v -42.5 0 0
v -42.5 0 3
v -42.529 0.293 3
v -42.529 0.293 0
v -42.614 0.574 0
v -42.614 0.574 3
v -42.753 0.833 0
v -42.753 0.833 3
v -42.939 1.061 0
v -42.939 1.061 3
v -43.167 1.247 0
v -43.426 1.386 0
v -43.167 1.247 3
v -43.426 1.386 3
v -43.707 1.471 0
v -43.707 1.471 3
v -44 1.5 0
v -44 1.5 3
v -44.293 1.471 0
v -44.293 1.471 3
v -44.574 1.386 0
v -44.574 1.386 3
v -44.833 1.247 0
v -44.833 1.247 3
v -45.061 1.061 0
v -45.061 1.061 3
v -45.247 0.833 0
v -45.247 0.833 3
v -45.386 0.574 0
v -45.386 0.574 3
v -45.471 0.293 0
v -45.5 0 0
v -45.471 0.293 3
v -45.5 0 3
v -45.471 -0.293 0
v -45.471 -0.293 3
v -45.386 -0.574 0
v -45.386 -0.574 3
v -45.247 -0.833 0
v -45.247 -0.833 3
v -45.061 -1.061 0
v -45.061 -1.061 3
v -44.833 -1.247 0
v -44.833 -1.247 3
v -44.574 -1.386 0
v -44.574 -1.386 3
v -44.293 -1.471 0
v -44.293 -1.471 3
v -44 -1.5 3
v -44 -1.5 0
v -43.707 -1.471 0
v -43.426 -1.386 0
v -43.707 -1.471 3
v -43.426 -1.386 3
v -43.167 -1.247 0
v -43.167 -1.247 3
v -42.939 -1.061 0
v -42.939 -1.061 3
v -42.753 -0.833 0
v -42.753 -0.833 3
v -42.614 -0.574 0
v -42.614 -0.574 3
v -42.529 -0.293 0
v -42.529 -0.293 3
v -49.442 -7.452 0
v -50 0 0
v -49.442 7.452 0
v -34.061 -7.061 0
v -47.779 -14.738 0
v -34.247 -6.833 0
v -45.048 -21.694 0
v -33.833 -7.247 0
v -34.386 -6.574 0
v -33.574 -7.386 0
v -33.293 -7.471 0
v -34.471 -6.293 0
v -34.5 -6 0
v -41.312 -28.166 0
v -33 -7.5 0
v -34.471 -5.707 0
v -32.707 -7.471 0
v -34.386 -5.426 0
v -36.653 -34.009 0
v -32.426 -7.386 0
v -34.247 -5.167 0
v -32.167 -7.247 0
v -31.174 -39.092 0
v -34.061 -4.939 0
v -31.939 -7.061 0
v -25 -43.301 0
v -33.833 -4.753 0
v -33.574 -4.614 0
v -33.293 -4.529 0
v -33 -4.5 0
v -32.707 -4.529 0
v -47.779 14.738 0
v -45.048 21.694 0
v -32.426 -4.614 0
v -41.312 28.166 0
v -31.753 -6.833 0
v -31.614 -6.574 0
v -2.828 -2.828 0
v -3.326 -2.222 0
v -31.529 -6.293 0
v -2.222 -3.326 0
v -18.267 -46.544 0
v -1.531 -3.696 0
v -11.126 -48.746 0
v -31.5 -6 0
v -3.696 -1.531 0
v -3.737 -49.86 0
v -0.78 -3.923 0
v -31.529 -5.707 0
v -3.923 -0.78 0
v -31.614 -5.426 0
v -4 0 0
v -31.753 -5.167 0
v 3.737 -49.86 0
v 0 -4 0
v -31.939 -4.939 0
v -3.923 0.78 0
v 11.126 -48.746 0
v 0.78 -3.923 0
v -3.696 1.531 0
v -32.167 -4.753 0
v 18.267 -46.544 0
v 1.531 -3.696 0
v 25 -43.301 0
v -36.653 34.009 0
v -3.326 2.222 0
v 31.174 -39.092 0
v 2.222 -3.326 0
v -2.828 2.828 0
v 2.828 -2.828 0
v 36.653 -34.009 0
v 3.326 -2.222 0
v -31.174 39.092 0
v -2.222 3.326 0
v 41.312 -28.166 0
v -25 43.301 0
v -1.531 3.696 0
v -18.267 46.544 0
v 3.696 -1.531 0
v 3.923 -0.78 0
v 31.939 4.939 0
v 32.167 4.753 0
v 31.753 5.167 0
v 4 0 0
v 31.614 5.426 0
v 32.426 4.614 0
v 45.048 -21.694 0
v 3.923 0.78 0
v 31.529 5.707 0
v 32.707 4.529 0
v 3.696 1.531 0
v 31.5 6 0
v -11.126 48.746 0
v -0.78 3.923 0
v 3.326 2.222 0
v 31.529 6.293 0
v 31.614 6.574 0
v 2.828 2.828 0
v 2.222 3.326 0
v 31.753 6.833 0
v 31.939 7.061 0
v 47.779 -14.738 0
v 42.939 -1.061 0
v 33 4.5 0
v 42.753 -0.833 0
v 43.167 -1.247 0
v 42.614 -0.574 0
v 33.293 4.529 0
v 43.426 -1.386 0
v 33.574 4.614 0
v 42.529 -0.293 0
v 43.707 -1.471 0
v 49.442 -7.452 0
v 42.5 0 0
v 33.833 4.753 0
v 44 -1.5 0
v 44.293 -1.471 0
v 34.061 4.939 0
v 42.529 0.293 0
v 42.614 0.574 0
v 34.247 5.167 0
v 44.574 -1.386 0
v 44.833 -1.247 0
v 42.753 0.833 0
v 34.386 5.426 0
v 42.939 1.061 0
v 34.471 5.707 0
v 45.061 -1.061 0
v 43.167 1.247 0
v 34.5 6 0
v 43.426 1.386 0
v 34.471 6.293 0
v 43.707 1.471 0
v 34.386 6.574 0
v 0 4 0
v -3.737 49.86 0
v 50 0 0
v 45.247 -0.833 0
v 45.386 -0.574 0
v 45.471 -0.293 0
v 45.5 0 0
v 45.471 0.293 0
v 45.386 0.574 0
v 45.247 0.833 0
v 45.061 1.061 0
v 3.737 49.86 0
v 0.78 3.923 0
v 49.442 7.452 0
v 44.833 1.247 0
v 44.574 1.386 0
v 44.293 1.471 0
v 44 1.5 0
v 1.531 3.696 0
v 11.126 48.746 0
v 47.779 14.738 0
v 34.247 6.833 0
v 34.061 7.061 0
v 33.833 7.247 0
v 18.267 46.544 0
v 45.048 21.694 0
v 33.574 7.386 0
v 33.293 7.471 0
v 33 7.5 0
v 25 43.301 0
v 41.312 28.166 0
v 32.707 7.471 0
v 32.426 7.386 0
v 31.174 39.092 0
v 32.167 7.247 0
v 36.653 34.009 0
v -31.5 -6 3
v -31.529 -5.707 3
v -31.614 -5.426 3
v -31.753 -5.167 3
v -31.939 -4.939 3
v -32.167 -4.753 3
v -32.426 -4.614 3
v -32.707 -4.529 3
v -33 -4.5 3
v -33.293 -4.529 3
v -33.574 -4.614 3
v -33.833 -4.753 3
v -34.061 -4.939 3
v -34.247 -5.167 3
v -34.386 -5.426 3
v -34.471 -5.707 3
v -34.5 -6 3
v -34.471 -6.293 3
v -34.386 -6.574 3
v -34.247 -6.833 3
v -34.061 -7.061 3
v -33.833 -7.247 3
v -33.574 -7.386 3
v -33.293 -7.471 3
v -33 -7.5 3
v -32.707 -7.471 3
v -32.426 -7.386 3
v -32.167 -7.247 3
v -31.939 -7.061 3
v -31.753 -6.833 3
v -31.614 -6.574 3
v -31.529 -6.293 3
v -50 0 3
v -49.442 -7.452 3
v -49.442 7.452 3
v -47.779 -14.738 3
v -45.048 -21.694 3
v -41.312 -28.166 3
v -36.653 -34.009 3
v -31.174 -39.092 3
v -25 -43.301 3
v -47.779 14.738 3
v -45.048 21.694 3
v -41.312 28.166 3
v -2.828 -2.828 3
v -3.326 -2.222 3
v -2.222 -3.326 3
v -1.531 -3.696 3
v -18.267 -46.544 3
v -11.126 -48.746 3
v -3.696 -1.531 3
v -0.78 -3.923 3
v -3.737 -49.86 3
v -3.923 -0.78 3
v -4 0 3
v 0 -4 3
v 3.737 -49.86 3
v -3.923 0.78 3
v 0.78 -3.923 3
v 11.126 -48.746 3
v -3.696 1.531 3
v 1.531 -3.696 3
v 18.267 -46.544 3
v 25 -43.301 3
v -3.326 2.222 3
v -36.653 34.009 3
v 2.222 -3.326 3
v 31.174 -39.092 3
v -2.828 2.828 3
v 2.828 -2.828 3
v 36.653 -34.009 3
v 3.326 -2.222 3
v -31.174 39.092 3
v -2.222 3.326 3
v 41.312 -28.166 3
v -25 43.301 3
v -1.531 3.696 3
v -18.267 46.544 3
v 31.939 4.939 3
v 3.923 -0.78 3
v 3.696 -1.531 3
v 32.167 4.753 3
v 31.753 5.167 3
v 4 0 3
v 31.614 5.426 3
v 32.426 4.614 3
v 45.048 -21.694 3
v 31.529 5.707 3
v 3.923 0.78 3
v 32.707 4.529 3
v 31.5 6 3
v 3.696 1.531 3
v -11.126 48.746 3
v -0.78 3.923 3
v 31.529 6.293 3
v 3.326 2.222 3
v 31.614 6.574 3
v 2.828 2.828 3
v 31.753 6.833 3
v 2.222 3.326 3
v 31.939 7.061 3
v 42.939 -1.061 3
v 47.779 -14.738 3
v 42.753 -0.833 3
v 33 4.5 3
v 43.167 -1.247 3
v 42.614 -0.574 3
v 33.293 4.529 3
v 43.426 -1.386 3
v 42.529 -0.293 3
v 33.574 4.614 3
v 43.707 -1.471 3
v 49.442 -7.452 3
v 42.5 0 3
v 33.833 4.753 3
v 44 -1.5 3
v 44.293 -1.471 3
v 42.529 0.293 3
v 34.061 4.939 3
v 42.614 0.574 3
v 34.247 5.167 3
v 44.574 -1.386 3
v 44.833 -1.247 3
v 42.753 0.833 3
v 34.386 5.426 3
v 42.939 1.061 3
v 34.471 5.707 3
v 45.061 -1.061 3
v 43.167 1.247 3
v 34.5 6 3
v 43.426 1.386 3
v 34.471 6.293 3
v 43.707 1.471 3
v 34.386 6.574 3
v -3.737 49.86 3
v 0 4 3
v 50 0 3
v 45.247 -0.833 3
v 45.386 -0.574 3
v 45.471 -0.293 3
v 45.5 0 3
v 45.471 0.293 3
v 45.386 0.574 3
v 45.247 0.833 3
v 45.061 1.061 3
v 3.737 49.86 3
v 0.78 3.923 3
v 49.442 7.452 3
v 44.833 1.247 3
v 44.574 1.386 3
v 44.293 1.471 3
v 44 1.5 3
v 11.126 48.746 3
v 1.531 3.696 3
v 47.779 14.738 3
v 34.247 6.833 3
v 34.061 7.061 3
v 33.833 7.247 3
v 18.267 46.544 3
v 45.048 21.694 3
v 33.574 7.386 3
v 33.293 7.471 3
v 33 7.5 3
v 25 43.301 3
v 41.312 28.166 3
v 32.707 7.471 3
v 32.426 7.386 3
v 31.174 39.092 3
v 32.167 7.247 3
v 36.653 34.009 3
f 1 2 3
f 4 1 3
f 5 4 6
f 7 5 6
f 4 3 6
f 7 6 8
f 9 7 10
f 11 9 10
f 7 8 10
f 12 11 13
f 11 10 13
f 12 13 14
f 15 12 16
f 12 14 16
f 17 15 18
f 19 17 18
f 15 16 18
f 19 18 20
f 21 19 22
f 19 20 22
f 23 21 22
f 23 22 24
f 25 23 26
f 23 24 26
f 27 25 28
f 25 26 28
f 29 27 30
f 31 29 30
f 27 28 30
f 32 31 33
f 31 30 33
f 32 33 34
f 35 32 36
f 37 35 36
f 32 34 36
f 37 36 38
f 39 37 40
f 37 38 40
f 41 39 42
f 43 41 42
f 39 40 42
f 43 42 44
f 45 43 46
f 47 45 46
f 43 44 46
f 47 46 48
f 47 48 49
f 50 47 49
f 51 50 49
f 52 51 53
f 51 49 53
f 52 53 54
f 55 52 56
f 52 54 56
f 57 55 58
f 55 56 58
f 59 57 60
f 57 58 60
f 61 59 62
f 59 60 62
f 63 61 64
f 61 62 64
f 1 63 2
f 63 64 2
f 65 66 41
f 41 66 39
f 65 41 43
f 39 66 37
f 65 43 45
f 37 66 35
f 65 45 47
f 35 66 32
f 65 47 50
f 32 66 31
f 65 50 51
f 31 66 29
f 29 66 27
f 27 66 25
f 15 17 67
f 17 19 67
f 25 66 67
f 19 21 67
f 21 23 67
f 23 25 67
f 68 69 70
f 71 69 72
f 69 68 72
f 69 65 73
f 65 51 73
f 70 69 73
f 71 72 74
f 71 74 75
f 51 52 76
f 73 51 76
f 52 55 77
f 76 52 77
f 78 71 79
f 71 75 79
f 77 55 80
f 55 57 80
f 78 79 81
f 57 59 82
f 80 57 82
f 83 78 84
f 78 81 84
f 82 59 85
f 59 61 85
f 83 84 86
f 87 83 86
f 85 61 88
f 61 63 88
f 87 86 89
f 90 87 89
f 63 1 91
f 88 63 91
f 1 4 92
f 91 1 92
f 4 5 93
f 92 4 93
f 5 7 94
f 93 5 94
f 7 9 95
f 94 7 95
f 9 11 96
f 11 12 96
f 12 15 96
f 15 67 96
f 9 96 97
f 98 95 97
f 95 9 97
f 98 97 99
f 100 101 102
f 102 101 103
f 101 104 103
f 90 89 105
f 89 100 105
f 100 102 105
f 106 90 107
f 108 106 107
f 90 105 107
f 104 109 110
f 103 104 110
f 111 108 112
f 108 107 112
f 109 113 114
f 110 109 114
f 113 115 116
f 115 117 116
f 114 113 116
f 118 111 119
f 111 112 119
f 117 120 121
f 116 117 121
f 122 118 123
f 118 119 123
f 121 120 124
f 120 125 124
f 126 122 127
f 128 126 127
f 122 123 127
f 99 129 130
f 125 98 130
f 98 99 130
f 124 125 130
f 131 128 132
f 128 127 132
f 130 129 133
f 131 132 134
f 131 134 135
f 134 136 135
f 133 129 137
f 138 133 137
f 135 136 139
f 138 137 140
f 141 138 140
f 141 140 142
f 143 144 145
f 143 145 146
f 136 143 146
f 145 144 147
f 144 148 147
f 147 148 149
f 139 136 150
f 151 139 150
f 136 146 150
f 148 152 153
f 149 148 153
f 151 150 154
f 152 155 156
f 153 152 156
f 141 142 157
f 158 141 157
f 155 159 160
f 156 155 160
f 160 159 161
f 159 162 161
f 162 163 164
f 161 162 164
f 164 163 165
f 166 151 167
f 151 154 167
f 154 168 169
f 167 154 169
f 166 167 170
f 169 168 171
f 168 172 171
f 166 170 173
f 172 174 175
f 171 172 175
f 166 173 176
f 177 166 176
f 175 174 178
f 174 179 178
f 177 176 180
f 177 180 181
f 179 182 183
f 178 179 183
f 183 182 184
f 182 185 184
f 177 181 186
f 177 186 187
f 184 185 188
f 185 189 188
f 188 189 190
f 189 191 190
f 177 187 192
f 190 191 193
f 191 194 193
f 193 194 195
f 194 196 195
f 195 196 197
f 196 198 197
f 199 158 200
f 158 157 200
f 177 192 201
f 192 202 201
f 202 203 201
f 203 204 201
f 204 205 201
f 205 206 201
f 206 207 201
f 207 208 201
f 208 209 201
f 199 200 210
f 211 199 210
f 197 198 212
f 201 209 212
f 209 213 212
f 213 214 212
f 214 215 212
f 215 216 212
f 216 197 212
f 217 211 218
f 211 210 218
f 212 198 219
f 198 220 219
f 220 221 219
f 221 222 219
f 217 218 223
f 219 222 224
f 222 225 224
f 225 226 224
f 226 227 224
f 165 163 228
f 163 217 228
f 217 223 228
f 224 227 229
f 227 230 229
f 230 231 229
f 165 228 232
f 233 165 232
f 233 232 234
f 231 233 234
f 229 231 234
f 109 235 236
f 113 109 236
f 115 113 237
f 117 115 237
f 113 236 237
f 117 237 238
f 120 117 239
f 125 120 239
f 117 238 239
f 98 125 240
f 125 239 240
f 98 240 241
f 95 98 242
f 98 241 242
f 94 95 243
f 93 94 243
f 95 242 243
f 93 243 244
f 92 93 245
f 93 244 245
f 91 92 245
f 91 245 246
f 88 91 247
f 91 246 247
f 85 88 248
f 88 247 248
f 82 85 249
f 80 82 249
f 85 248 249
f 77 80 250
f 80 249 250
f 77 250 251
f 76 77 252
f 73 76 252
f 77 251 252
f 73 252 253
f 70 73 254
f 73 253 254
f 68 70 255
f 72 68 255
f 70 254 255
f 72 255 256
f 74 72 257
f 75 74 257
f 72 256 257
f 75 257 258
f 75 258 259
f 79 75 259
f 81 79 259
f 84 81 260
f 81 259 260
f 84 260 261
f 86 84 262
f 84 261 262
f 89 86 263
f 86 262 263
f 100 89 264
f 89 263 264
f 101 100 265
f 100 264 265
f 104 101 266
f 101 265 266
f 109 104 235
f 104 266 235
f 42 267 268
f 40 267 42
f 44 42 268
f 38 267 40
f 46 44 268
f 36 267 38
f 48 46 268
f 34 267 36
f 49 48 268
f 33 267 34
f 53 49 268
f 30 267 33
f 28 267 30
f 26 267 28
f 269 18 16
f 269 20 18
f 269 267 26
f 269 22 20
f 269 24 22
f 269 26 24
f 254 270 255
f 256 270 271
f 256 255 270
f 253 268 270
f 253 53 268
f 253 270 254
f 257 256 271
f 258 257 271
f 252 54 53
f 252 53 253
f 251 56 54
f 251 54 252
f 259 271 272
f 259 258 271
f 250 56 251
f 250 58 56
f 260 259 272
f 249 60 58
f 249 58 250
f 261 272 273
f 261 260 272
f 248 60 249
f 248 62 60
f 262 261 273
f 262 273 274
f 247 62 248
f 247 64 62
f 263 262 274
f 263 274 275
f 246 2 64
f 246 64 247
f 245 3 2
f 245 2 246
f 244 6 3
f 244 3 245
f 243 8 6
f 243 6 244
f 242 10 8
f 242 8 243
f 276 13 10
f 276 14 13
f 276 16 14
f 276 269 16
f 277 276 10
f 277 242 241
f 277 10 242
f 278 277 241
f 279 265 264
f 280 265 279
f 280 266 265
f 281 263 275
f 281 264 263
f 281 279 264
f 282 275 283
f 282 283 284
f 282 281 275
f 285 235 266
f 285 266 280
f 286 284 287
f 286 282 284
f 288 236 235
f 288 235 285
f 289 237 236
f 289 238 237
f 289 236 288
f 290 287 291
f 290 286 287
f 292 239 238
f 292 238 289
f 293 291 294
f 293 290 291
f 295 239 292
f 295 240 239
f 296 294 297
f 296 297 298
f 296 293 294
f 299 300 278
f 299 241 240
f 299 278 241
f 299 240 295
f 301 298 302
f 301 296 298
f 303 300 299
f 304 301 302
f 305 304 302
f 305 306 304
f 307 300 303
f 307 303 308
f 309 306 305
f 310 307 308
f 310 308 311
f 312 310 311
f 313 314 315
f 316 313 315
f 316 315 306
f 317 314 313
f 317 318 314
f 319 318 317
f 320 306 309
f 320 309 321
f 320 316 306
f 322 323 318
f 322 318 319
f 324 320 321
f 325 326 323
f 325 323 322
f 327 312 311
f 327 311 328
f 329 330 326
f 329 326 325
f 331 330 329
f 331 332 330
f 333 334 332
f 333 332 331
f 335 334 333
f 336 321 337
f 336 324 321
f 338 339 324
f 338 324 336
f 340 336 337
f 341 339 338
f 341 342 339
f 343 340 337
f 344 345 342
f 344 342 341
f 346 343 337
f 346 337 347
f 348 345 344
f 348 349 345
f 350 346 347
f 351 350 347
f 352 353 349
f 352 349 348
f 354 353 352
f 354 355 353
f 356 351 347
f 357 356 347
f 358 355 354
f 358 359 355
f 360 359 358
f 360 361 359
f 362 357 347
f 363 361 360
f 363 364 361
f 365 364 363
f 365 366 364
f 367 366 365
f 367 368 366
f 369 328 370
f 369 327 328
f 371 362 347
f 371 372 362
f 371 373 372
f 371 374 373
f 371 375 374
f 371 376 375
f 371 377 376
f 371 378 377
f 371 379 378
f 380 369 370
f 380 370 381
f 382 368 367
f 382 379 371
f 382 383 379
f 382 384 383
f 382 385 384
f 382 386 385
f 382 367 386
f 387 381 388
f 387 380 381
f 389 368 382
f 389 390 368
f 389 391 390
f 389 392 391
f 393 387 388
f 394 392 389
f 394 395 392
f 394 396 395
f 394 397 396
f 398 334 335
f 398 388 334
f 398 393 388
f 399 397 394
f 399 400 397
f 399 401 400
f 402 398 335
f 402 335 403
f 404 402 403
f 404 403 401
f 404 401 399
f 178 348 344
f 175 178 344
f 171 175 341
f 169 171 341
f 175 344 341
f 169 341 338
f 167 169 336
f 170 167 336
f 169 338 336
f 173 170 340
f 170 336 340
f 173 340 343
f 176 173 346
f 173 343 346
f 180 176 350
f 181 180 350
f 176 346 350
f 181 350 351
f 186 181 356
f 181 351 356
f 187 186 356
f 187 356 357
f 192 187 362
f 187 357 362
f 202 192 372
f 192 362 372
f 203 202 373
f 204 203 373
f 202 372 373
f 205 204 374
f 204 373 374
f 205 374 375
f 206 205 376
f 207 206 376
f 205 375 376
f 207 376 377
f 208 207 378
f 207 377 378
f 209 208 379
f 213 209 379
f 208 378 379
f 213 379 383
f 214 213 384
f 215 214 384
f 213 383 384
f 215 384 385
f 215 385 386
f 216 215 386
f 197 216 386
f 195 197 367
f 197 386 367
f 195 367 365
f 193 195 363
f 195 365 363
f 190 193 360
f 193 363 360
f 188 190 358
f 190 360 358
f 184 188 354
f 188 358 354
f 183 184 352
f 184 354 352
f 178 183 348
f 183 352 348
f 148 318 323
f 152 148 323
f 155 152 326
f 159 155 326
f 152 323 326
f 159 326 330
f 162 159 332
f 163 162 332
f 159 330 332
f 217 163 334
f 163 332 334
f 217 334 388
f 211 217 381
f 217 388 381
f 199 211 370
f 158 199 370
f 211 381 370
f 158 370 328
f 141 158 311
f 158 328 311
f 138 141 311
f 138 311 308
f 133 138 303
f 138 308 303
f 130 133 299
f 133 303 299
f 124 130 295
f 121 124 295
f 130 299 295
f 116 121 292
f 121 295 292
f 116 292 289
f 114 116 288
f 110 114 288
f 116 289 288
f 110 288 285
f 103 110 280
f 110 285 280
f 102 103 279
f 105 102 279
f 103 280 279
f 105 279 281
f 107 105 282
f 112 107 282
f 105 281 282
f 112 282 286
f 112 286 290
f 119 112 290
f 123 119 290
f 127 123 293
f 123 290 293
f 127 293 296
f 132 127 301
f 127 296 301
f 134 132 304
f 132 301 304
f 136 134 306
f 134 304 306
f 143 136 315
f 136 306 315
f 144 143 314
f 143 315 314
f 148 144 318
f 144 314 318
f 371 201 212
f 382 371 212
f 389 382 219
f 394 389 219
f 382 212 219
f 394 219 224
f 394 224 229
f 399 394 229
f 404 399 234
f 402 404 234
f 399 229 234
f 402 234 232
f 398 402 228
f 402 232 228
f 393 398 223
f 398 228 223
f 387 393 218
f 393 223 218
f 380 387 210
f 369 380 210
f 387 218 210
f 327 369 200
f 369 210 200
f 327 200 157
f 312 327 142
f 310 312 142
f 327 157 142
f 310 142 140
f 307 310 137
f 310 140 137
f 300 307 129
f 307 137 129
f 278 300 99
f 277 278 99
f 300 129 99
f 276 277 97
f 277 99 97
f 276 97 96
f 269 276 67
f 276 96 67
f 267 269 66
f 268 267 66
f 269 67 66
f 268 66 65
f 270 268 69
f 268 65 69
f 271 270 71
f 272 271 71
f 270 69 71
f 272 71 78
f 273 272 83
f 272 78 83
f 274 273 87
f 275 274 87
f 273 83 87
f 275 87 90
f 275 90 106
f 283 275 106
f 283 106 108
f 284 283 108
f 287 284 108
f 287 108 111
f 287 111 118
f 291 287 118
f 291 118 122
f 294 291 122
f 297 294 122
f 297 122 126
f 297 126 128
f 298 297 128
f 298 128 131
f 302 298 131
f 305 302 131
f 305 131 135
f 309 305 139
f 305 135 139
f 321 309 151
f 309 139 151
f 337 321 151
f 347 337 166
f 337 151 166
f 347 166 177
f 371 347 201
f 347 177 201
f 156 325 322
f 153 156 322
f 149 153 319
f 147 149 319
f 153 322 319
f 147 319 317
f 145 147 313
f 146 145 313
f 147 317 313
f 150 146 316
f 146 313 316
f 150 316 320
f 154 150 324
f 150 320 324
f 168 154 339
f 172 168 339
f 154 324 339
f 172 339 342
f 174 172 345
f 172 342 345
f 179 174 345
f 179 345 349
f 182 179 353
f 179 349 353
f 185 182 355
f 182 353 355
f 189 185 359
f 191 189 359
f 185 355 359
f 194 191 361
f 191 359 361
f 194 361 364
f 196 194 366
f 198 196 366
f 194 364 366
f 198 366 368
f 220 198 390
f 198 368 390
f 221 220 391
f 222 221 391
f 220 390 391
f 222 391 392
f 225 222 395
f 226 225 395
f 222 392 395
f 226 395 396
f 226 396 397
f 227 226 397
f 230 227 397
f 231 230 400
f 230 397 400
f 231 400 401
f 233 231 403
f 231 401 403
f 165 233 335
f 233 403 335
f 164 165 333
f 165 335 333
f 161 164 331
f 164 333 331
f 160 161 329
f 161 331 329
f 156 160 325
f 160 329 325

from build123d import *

# Parameters (mm, degrees)
ESQUISSE1_R             = 50
BOSS_EXTRU_1_DEPTH      = 3
ESQUISSE2_R             = 4
ENL_V_MAT_EXTRU_1_DEPTH = 3
ESQUISSE3_R             = 1.5
ENL_V_MAT_EXTRU_2_DEPTH = 3
R_P_T_PAR_COURBE1_COUNT = 2
ESQUISSE4_R             = 1.5
ENL_V_MAT_EXTRU_3_DEPTH = 3
R_P_T_PAR_COURBE2_COUNT = 2


with BuildPart() as part:
    # Esquisse1 → Boss.-Extru.1 (new body)
    with BuildSketch(Plane.XY):
        Circle(ESQUISSE1_R)
    extrude(amount=BOSS_EXTRU_1_DEPTH)

    # Esquisse2 → Enlèv. mat.-Extru.1 (cut)
    with BuildSketch(Plane.XY.offset(3)):
        Circle(ESQUISSE2_R)
    extrude(amount=-ENL_V_MAT_EXTRU_1_DEPTH, mode=Mode.SUBTRACT)

    # Esquisse3 → Enlèv. mat.-Extru.2 (cut)
    with BuildSketch(Plane.XY.offset(3)):
        with Locations((-44, 0)):
            Circle(ESQUISSE3_R)
    enl_v_mat_extru_2 = extrude(amount=-ENL_V_MAT_EXTRU_2_DEPTH, mode=Mode.SUBTRACT)

    # Répét. par courbe1: Enlèv. mat.-Extru.2 ×2 about axis
    r_p_t_par_courbe1_axis = Axis((0, 0, 3), (0, 0, 1))
    for i in range(1, R_P_T_PAR_COURBE1_COUNT):
        add(enl_v_mat_extru_2.rotate(r_p_t_par_courbe1_axis, i * 360 / R_P_T_PAR_COURBE1_COUNT), mode=Mode.SUBTRACT)

    # Esquisse4 → Enlèv. mat.-Extru.3 (cut)
    with BuildSketch(Plane.XY.offset(3)):
        with Locations((-33, -6)):
            Circle(ESQUISSE4_R)
    enl_v_mat_extru_3 = extrude(amount=-ENL_V_MAT_EXTRU_3_DEPTH, mode=Mode.SUBTRACT)

    # Répét. par courbe2: Enlèv. mat.-Extru.3 ×2 about axis
    r_p_t_par_courbe2_axis = Axis((0, 0, 3), (0, 0, 1))
    for i in range(1, R_P_T_PAR_COURBE2_COUNT):
        add(enl_v_mat_extru_3.rotate(r_p_t_par_courbe2_axis, i * 360 / R_P_T_PAR_COURBE2_COUNT), mode=Mode.SUBTRACT)


solid = part.part
